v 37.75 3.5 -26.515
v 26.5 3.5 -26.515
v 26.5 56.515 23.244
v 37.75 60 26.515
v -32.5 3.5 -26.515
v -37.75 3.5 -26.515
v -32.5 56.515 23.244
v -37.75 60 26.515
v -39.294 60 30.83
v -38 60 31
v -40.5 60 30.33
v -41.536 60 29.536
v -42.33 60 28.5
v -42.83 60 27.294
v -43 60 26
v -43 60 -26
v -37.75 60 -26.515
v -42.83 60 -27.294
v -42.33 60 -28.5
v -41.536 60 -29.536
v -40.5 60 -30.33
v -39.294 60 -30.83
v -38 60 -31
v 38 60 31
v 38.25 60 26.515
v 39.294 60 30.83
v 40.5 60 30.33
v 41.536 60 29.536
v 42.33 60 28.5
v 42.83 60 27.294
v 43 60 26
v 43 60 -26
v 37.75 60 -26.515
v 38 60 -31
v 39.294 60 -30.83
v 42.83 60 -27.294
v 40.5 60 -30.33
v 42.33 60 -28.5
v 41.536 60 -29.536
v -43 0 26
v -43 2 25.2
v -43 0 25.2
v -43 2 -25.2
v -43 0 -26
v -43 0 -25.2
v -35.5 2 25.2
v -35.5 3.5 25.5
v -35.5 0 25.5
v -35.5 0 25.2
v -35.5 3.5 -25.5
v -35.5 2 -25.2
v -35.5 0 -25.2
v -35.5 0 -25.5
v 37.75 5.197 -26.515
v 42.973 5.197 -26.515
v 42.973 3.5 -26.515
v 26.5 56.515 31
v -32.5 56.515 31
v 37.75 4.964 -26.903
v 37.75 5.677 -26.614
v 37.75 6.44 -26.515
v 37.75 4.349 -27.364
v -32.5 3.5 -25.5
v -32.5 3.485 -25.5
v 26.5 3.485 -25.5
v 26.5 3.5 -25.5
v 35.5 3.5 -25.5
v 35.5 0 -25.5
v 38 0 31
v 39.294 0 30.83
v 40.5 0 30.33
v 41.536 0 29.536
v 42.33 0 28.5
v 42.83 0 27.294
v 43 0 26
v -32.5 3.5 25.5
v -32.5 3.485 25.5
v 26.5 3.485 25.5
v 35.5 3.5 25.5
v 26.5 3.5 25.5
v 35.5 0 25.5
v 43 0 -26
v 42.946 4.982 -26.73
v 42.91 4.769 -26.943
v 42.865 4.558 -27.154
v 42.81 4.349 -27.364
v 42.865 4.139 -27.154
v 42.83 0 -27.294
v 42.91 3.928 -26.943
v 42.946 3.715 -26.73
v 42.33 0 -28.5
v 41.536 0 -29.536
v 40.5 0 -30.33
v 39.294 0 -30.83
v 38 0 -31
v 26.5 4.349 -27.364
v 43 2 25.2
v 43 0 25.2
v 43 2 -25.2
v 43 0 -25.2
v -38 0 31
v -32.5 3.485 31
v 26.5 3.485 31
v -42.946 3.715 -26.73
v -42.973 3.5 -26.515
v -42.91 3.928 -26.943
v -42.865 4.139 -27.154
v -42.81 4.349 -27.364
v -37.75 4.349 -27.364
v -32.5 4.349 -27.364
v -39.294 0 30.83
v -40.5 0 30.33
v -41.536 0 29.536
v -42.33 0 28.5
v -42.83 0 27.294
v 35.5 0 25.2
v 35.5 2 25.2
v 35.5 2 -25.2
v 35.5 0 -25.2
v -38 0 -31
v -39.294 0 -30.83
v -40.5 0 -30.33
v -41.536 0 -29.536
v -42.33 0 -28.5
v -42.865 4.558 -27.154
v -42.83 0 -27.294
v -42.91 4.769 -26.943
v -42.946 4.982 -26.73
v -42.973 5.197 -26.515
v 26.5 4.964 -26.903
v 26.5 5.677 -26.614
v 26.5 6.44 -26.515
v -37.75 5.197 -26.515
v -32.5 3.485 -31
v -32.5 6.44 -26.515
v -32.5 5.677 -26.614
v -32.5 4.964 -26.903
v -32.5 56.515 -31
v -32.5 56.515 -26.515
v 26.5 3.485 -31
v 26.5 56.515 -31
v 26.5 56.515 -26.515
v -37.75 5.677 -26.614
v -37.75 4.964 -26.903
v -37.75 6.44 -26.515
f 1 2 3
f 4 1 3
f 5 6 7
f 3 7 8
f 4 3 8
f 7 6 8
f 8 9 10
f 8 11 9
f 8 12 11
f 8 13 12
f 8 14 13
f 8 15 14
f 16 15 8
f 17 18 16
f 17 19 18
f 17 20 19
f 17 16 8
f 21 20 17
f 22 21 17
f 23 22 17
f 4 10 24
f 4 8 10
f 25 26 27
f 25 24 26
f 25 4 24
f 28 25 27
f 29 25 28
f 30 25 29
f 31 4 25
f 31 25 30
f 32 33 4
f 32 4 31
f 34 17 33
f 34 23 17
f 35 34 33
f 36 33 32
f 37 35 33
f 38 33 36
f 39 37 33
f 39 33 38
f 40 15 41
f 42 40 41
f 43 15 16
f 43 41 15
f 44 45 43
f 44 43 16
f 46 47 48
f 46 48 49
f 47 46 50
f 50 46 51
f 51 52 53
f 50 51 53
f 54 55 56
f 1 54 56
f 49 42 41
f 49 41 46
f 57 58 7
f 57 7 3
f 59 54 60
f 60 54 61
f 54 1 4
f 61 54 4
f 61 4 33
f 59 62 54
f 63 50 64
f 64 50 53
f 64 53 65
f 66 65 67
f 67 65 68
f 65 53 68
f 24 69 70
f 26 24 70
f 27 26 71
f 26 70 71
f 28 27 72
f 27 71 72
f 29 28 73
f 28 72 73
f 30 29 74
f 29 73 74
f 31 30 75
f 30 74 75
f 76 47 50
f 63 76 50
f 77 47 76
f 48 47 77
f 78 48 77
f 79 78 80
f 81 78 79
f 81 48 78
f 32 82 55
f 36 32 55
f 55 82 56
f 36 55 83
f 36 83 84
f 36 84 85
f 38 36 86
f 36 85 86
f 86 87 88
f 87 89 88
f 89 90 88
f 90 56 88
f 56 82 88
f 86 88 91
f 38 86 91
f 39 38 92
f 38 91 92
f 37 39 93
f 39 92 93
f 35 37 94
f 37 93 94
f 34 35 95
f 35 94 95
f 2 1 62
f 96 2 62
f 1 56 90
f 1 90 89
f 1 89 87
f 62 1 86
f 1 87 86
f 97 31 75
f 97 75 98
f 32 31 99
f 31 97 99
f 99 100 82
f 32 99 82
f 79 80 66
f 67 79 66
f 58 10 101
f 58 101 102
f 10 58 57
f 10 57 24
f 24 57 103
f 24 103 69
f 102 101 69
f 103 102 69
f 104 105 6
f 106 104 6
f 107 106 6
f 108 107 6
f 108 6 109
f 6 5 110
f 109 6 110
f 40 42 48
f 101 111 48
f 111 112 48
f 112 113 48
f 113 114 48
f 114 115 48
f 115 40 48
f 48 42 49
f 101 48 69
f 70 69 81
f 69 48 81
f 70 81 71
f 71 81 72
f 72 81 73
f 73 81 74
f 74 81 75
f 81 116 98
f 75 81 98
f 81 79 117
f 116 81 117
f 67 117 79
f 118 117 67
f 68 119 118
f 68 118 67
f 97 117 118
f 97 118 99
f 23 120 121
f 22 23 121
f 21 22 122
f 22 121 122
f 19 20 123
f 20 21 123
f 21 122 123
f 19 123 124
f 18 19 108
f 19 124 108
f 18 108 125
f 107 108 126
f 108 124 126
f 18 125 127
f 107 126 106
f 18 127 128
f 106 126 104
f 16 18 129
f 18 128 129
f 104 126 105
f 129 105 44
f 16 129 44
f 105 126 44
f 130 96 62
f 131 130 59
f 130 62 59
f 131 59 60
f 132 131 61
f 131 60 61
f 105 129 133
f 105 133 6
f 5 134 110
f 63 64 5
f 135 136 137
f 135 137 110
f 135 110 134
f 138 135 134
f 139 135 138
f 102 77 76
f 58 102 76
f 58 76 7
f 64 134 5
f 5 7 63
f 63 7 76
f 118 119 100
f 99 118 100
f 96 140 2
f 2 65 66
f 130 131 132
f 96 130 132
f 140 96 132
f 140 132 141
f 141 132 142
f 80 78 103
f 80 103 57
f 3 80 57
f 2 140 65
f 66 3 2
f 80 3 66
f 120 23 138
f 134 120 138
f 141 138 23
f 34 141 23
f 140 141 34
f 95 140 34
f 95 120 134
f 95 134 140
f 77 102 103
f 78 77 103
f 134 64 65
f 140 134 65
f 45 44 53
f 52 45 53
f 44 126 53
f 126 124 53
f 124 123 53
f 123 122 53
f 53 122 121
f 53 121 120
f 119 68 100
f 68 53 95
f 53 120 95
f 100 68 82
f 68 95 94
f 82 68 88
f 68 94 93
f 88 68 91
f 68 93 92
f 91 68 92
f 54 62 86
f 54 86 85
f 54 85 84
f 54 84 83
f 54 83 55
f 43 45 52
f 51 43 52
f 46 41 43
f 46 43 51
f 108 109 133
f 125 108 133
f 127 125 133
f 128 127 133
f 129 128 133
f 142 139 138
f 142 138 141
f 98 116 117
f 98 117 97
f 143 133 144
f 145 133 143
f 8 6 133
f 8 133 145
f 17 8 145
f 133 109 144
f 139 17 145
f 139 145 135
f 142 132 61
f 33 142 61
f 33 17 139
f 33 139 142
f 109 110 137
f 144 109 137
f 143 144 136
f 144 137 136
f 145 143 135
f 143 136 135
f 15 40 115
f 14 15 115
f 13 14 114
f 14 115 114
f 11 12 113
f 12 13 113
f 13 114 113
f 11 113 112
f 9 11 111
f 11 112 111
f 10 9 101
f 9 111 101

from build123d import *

# Parameters (mm, degrees)
SKETCH_1_W               = 86
SKETCH_1_H               = 62
SKETCH_1_W_2             = 71
SKETCH_1_H_2             = 51
EXTRUDE_1_DEPTH          = 60
SKETCH_2_W               = 75.5
SKETCH_2_H               = 53.03
CUT_EXTRUDE_1_DEPTH      = 56.5
EXTRUDE_2_DEPTH          = 76
SKETCH_4_W               = 59
SKETCH_4_H               = 53.03
CUT_EXTRUDE_2_DEPTH      = 97.400207469
CUT_EXTRUDE_3_DEPTH      = 97.908461963
CUT_EXTRUDE_3_DEPTH_BACK = 97.908461963
SKETCH_7_W               = 86
SKETCH_7_H               = 50.4
CUT_EXTRUDE_4_DEPTH      = 2
FILLET_1_R               = 5
FILLET_2_R               = 3


with BuildPart() as part:
    # 草图1 → 凸台-拉伸1 (new body)
    with BuildSketch(Plane(origin=(0, 0, 0), x_dir=(1, 0, 0), z_dir=(0, 1, 0))):
        Rectangle(SKETCH_1_W, SKETCH_1_H)
        Rectangle(SKETCH_1_W_2, SKETCH_1_H_2, mode=Mode.SUBTRACT)
    extrude(amount=EXTRUDE_1_DEPTH)

    # 草图2 → 切除-拉伸1 (cut)
    with BuildSketch(Plane(origin=(0, 60, 0), x_dir=(1, 0, 0), z_dir=(0, 1, 0))):
        Rectangle(SKETCH_2_W, SKETCH_2_H)
    extrude(amount=-CUT_EXTRUDE_1_DEPTH, mode=Mode.SUBTRACT)

    # 草图3 → 凸台-拉伸2 (add)
    with BuildSketch(Plane(origin=(-37.75, 0, 0), x_dir=(0, 0, -1), z_dir=(1, 0, 0))):
        Polygon((26.515, 3.5), (-26.515, 60), (-26.515, 3.5), align=None)
    extrude(amount=EXTRUDE_2_DEPTH)

    # 草图4 → 切除-拉伸2 (cut, through all)
    with BuildSketch(Plane.XY.offset(31)):
        with Locations((-3, 30)):
            Rectangle(SKETCH_4_W, SKETCH_4_H)
    extrude(amount=-CUT_EXTRUDE_2_DEPTH, mode=Mode.SUBTRACT)

    # 草图5 → 切除-拉伸3 (cut, two sides: drawn at the far end of the back side and taken through both)
    with BuildSketch(Plane.ZY.offset(-26.5).offset(-CUT_EXTRUDE_3_DEPTH_BACK)):
        Polygon((-26.515, 3.5), (-27.363528137, 4.348528137), (-26.515, 5.197056275), align=None)
    extrude(amount=CUT_EXTRUDE_3_DEPTH + CUT_EXTRUDE_3_DEPTH_BACK, mode=Mode.SUBTRACT)

    # 草图7 → 切除-拉伸4 (cut)
    with BuildSketch(Plane.XZ):
        Rectangle(SKETCH_7_W, SKETCH_7_H)
    extrude(amount=-CUT_EXTRUDE_4_DEPTH, mode=Mode.SUBTRACT)

    # 圆角1
    # the kernel refuses this fillet: 5 mm, written as the material it takes off along each edge
    with BuildSketch(Plane(origin=(43, -12.5, 31), x_dir=(-1, 0, 0), z_dir=(0, 1, 0)), Plane(origin=(43, -12.5, -31), x_dir=(0, 0, 1), z_dir=(0, 1, 0))) as fillet_1_piece_1:
        with BuildLine():
            CenterArc((FILLET_1_R, -FILLET_1_R), FILLET_1_R, 90, 90)
            Line((0, -FILLET_1_R), (0, 0))
            Line((0, 0), (FILLET_1_R, 0))
        make_face()
    extrude(amount=85, mode=Mode.SUBTRACT)
    with BuildSketch(Plane(origin=(-43, -12.5, 31), x_dir=(1, 0, 0), z_dir=(0, 1, 0)), Plane(origin=(-43, -12.5, -31), x_dir=(0, 0, 1), z_dir=(0, 1, 0))) as fillet_1_piece_2:
        with BuildLine():
            CenterArc((FILLET_1_R, FILLET_1_R), FILLET_1_R, 180, 90)
            Line((0, FILLET_1_R), (0, 0))
            Line((0, 0), (FILLET_1_R, 0))
        make_face()
    extrude(amount=85, mode=Mode.SUBTRACT)

    # 圆角2
    # the kernel refuses this fillet: 3 mm, written as the material it takes off along each edge
    with BuildSketch(Plane(origin=(37.75, 5.197056275, -26.515), x_dir=(0, 1, 0), z_dir=(-1, 0, 0))) as fillet_2_piece_1_section:
        with BuildLine():
            CenterArc((FILLET_2_R * 0.414213562373, FILLET_2_R), FILLET_2_R, 225, 45)
            Line((-FILLET_2_R * 0.292893218813, FILLET_2_R * 0.292893218813), (0, 0))
            Line((0, 0), (FILLET_2_R * 0.414213562373, 0))
        make_face()
    fillet_2_piece_1 = extrude(amount=14.356601718, mode=Mode.PRIVATE)
    fillet_2_piece_1 = split(fillet_2_piece_1, bisect_by=Plane(origin=(32.125, 4.476160676, -27.491160676), z_dir=(0, 0.7071067811865434, 0.7071067811865518)), keep=Keep.TOP, mode=Mode.PRIVATE)
    add(fillet_2_piece_1, mode=Mode.SUBTRACT)
    with BuildSketch(Plane(origin=(-29.393398282, 5.197056275, -26.515), x_dir=(0, 1, 0), z_dir=(-1, 0, 0))) as fillet_2_piece_2_section:
        with BuildLine():
            CenterArc((FILLET_2_R * 0.414213562373, FILLET_2_R), FILLET_2_R, 225, 45)
            Line((-FILLET_2_R * 0.292893218813, FILLET_2_R * 0.292893218813), (0, 0))
            Line((0, 0), (FILLET_2_R * 0.414213562373, 0))
        make_face()
    fillet_2_piece_2 = extrude(amount=8.356601718, mode=Mode.PRIVATE)
    fillet_2_piece_2 = split(fillet_2_piece_2, bisect_by=Plane(origin=(-35.125, 4.476160676, -27.491160676), z_dir=(0, 0.7071067811865434, 0.7071067811865518)), keep=Keep.TOP, mode=Mode.PRIVATE)
    add(fillet_2_piece_2, mode=Mode.SUBTRACT)


solid = part.part
